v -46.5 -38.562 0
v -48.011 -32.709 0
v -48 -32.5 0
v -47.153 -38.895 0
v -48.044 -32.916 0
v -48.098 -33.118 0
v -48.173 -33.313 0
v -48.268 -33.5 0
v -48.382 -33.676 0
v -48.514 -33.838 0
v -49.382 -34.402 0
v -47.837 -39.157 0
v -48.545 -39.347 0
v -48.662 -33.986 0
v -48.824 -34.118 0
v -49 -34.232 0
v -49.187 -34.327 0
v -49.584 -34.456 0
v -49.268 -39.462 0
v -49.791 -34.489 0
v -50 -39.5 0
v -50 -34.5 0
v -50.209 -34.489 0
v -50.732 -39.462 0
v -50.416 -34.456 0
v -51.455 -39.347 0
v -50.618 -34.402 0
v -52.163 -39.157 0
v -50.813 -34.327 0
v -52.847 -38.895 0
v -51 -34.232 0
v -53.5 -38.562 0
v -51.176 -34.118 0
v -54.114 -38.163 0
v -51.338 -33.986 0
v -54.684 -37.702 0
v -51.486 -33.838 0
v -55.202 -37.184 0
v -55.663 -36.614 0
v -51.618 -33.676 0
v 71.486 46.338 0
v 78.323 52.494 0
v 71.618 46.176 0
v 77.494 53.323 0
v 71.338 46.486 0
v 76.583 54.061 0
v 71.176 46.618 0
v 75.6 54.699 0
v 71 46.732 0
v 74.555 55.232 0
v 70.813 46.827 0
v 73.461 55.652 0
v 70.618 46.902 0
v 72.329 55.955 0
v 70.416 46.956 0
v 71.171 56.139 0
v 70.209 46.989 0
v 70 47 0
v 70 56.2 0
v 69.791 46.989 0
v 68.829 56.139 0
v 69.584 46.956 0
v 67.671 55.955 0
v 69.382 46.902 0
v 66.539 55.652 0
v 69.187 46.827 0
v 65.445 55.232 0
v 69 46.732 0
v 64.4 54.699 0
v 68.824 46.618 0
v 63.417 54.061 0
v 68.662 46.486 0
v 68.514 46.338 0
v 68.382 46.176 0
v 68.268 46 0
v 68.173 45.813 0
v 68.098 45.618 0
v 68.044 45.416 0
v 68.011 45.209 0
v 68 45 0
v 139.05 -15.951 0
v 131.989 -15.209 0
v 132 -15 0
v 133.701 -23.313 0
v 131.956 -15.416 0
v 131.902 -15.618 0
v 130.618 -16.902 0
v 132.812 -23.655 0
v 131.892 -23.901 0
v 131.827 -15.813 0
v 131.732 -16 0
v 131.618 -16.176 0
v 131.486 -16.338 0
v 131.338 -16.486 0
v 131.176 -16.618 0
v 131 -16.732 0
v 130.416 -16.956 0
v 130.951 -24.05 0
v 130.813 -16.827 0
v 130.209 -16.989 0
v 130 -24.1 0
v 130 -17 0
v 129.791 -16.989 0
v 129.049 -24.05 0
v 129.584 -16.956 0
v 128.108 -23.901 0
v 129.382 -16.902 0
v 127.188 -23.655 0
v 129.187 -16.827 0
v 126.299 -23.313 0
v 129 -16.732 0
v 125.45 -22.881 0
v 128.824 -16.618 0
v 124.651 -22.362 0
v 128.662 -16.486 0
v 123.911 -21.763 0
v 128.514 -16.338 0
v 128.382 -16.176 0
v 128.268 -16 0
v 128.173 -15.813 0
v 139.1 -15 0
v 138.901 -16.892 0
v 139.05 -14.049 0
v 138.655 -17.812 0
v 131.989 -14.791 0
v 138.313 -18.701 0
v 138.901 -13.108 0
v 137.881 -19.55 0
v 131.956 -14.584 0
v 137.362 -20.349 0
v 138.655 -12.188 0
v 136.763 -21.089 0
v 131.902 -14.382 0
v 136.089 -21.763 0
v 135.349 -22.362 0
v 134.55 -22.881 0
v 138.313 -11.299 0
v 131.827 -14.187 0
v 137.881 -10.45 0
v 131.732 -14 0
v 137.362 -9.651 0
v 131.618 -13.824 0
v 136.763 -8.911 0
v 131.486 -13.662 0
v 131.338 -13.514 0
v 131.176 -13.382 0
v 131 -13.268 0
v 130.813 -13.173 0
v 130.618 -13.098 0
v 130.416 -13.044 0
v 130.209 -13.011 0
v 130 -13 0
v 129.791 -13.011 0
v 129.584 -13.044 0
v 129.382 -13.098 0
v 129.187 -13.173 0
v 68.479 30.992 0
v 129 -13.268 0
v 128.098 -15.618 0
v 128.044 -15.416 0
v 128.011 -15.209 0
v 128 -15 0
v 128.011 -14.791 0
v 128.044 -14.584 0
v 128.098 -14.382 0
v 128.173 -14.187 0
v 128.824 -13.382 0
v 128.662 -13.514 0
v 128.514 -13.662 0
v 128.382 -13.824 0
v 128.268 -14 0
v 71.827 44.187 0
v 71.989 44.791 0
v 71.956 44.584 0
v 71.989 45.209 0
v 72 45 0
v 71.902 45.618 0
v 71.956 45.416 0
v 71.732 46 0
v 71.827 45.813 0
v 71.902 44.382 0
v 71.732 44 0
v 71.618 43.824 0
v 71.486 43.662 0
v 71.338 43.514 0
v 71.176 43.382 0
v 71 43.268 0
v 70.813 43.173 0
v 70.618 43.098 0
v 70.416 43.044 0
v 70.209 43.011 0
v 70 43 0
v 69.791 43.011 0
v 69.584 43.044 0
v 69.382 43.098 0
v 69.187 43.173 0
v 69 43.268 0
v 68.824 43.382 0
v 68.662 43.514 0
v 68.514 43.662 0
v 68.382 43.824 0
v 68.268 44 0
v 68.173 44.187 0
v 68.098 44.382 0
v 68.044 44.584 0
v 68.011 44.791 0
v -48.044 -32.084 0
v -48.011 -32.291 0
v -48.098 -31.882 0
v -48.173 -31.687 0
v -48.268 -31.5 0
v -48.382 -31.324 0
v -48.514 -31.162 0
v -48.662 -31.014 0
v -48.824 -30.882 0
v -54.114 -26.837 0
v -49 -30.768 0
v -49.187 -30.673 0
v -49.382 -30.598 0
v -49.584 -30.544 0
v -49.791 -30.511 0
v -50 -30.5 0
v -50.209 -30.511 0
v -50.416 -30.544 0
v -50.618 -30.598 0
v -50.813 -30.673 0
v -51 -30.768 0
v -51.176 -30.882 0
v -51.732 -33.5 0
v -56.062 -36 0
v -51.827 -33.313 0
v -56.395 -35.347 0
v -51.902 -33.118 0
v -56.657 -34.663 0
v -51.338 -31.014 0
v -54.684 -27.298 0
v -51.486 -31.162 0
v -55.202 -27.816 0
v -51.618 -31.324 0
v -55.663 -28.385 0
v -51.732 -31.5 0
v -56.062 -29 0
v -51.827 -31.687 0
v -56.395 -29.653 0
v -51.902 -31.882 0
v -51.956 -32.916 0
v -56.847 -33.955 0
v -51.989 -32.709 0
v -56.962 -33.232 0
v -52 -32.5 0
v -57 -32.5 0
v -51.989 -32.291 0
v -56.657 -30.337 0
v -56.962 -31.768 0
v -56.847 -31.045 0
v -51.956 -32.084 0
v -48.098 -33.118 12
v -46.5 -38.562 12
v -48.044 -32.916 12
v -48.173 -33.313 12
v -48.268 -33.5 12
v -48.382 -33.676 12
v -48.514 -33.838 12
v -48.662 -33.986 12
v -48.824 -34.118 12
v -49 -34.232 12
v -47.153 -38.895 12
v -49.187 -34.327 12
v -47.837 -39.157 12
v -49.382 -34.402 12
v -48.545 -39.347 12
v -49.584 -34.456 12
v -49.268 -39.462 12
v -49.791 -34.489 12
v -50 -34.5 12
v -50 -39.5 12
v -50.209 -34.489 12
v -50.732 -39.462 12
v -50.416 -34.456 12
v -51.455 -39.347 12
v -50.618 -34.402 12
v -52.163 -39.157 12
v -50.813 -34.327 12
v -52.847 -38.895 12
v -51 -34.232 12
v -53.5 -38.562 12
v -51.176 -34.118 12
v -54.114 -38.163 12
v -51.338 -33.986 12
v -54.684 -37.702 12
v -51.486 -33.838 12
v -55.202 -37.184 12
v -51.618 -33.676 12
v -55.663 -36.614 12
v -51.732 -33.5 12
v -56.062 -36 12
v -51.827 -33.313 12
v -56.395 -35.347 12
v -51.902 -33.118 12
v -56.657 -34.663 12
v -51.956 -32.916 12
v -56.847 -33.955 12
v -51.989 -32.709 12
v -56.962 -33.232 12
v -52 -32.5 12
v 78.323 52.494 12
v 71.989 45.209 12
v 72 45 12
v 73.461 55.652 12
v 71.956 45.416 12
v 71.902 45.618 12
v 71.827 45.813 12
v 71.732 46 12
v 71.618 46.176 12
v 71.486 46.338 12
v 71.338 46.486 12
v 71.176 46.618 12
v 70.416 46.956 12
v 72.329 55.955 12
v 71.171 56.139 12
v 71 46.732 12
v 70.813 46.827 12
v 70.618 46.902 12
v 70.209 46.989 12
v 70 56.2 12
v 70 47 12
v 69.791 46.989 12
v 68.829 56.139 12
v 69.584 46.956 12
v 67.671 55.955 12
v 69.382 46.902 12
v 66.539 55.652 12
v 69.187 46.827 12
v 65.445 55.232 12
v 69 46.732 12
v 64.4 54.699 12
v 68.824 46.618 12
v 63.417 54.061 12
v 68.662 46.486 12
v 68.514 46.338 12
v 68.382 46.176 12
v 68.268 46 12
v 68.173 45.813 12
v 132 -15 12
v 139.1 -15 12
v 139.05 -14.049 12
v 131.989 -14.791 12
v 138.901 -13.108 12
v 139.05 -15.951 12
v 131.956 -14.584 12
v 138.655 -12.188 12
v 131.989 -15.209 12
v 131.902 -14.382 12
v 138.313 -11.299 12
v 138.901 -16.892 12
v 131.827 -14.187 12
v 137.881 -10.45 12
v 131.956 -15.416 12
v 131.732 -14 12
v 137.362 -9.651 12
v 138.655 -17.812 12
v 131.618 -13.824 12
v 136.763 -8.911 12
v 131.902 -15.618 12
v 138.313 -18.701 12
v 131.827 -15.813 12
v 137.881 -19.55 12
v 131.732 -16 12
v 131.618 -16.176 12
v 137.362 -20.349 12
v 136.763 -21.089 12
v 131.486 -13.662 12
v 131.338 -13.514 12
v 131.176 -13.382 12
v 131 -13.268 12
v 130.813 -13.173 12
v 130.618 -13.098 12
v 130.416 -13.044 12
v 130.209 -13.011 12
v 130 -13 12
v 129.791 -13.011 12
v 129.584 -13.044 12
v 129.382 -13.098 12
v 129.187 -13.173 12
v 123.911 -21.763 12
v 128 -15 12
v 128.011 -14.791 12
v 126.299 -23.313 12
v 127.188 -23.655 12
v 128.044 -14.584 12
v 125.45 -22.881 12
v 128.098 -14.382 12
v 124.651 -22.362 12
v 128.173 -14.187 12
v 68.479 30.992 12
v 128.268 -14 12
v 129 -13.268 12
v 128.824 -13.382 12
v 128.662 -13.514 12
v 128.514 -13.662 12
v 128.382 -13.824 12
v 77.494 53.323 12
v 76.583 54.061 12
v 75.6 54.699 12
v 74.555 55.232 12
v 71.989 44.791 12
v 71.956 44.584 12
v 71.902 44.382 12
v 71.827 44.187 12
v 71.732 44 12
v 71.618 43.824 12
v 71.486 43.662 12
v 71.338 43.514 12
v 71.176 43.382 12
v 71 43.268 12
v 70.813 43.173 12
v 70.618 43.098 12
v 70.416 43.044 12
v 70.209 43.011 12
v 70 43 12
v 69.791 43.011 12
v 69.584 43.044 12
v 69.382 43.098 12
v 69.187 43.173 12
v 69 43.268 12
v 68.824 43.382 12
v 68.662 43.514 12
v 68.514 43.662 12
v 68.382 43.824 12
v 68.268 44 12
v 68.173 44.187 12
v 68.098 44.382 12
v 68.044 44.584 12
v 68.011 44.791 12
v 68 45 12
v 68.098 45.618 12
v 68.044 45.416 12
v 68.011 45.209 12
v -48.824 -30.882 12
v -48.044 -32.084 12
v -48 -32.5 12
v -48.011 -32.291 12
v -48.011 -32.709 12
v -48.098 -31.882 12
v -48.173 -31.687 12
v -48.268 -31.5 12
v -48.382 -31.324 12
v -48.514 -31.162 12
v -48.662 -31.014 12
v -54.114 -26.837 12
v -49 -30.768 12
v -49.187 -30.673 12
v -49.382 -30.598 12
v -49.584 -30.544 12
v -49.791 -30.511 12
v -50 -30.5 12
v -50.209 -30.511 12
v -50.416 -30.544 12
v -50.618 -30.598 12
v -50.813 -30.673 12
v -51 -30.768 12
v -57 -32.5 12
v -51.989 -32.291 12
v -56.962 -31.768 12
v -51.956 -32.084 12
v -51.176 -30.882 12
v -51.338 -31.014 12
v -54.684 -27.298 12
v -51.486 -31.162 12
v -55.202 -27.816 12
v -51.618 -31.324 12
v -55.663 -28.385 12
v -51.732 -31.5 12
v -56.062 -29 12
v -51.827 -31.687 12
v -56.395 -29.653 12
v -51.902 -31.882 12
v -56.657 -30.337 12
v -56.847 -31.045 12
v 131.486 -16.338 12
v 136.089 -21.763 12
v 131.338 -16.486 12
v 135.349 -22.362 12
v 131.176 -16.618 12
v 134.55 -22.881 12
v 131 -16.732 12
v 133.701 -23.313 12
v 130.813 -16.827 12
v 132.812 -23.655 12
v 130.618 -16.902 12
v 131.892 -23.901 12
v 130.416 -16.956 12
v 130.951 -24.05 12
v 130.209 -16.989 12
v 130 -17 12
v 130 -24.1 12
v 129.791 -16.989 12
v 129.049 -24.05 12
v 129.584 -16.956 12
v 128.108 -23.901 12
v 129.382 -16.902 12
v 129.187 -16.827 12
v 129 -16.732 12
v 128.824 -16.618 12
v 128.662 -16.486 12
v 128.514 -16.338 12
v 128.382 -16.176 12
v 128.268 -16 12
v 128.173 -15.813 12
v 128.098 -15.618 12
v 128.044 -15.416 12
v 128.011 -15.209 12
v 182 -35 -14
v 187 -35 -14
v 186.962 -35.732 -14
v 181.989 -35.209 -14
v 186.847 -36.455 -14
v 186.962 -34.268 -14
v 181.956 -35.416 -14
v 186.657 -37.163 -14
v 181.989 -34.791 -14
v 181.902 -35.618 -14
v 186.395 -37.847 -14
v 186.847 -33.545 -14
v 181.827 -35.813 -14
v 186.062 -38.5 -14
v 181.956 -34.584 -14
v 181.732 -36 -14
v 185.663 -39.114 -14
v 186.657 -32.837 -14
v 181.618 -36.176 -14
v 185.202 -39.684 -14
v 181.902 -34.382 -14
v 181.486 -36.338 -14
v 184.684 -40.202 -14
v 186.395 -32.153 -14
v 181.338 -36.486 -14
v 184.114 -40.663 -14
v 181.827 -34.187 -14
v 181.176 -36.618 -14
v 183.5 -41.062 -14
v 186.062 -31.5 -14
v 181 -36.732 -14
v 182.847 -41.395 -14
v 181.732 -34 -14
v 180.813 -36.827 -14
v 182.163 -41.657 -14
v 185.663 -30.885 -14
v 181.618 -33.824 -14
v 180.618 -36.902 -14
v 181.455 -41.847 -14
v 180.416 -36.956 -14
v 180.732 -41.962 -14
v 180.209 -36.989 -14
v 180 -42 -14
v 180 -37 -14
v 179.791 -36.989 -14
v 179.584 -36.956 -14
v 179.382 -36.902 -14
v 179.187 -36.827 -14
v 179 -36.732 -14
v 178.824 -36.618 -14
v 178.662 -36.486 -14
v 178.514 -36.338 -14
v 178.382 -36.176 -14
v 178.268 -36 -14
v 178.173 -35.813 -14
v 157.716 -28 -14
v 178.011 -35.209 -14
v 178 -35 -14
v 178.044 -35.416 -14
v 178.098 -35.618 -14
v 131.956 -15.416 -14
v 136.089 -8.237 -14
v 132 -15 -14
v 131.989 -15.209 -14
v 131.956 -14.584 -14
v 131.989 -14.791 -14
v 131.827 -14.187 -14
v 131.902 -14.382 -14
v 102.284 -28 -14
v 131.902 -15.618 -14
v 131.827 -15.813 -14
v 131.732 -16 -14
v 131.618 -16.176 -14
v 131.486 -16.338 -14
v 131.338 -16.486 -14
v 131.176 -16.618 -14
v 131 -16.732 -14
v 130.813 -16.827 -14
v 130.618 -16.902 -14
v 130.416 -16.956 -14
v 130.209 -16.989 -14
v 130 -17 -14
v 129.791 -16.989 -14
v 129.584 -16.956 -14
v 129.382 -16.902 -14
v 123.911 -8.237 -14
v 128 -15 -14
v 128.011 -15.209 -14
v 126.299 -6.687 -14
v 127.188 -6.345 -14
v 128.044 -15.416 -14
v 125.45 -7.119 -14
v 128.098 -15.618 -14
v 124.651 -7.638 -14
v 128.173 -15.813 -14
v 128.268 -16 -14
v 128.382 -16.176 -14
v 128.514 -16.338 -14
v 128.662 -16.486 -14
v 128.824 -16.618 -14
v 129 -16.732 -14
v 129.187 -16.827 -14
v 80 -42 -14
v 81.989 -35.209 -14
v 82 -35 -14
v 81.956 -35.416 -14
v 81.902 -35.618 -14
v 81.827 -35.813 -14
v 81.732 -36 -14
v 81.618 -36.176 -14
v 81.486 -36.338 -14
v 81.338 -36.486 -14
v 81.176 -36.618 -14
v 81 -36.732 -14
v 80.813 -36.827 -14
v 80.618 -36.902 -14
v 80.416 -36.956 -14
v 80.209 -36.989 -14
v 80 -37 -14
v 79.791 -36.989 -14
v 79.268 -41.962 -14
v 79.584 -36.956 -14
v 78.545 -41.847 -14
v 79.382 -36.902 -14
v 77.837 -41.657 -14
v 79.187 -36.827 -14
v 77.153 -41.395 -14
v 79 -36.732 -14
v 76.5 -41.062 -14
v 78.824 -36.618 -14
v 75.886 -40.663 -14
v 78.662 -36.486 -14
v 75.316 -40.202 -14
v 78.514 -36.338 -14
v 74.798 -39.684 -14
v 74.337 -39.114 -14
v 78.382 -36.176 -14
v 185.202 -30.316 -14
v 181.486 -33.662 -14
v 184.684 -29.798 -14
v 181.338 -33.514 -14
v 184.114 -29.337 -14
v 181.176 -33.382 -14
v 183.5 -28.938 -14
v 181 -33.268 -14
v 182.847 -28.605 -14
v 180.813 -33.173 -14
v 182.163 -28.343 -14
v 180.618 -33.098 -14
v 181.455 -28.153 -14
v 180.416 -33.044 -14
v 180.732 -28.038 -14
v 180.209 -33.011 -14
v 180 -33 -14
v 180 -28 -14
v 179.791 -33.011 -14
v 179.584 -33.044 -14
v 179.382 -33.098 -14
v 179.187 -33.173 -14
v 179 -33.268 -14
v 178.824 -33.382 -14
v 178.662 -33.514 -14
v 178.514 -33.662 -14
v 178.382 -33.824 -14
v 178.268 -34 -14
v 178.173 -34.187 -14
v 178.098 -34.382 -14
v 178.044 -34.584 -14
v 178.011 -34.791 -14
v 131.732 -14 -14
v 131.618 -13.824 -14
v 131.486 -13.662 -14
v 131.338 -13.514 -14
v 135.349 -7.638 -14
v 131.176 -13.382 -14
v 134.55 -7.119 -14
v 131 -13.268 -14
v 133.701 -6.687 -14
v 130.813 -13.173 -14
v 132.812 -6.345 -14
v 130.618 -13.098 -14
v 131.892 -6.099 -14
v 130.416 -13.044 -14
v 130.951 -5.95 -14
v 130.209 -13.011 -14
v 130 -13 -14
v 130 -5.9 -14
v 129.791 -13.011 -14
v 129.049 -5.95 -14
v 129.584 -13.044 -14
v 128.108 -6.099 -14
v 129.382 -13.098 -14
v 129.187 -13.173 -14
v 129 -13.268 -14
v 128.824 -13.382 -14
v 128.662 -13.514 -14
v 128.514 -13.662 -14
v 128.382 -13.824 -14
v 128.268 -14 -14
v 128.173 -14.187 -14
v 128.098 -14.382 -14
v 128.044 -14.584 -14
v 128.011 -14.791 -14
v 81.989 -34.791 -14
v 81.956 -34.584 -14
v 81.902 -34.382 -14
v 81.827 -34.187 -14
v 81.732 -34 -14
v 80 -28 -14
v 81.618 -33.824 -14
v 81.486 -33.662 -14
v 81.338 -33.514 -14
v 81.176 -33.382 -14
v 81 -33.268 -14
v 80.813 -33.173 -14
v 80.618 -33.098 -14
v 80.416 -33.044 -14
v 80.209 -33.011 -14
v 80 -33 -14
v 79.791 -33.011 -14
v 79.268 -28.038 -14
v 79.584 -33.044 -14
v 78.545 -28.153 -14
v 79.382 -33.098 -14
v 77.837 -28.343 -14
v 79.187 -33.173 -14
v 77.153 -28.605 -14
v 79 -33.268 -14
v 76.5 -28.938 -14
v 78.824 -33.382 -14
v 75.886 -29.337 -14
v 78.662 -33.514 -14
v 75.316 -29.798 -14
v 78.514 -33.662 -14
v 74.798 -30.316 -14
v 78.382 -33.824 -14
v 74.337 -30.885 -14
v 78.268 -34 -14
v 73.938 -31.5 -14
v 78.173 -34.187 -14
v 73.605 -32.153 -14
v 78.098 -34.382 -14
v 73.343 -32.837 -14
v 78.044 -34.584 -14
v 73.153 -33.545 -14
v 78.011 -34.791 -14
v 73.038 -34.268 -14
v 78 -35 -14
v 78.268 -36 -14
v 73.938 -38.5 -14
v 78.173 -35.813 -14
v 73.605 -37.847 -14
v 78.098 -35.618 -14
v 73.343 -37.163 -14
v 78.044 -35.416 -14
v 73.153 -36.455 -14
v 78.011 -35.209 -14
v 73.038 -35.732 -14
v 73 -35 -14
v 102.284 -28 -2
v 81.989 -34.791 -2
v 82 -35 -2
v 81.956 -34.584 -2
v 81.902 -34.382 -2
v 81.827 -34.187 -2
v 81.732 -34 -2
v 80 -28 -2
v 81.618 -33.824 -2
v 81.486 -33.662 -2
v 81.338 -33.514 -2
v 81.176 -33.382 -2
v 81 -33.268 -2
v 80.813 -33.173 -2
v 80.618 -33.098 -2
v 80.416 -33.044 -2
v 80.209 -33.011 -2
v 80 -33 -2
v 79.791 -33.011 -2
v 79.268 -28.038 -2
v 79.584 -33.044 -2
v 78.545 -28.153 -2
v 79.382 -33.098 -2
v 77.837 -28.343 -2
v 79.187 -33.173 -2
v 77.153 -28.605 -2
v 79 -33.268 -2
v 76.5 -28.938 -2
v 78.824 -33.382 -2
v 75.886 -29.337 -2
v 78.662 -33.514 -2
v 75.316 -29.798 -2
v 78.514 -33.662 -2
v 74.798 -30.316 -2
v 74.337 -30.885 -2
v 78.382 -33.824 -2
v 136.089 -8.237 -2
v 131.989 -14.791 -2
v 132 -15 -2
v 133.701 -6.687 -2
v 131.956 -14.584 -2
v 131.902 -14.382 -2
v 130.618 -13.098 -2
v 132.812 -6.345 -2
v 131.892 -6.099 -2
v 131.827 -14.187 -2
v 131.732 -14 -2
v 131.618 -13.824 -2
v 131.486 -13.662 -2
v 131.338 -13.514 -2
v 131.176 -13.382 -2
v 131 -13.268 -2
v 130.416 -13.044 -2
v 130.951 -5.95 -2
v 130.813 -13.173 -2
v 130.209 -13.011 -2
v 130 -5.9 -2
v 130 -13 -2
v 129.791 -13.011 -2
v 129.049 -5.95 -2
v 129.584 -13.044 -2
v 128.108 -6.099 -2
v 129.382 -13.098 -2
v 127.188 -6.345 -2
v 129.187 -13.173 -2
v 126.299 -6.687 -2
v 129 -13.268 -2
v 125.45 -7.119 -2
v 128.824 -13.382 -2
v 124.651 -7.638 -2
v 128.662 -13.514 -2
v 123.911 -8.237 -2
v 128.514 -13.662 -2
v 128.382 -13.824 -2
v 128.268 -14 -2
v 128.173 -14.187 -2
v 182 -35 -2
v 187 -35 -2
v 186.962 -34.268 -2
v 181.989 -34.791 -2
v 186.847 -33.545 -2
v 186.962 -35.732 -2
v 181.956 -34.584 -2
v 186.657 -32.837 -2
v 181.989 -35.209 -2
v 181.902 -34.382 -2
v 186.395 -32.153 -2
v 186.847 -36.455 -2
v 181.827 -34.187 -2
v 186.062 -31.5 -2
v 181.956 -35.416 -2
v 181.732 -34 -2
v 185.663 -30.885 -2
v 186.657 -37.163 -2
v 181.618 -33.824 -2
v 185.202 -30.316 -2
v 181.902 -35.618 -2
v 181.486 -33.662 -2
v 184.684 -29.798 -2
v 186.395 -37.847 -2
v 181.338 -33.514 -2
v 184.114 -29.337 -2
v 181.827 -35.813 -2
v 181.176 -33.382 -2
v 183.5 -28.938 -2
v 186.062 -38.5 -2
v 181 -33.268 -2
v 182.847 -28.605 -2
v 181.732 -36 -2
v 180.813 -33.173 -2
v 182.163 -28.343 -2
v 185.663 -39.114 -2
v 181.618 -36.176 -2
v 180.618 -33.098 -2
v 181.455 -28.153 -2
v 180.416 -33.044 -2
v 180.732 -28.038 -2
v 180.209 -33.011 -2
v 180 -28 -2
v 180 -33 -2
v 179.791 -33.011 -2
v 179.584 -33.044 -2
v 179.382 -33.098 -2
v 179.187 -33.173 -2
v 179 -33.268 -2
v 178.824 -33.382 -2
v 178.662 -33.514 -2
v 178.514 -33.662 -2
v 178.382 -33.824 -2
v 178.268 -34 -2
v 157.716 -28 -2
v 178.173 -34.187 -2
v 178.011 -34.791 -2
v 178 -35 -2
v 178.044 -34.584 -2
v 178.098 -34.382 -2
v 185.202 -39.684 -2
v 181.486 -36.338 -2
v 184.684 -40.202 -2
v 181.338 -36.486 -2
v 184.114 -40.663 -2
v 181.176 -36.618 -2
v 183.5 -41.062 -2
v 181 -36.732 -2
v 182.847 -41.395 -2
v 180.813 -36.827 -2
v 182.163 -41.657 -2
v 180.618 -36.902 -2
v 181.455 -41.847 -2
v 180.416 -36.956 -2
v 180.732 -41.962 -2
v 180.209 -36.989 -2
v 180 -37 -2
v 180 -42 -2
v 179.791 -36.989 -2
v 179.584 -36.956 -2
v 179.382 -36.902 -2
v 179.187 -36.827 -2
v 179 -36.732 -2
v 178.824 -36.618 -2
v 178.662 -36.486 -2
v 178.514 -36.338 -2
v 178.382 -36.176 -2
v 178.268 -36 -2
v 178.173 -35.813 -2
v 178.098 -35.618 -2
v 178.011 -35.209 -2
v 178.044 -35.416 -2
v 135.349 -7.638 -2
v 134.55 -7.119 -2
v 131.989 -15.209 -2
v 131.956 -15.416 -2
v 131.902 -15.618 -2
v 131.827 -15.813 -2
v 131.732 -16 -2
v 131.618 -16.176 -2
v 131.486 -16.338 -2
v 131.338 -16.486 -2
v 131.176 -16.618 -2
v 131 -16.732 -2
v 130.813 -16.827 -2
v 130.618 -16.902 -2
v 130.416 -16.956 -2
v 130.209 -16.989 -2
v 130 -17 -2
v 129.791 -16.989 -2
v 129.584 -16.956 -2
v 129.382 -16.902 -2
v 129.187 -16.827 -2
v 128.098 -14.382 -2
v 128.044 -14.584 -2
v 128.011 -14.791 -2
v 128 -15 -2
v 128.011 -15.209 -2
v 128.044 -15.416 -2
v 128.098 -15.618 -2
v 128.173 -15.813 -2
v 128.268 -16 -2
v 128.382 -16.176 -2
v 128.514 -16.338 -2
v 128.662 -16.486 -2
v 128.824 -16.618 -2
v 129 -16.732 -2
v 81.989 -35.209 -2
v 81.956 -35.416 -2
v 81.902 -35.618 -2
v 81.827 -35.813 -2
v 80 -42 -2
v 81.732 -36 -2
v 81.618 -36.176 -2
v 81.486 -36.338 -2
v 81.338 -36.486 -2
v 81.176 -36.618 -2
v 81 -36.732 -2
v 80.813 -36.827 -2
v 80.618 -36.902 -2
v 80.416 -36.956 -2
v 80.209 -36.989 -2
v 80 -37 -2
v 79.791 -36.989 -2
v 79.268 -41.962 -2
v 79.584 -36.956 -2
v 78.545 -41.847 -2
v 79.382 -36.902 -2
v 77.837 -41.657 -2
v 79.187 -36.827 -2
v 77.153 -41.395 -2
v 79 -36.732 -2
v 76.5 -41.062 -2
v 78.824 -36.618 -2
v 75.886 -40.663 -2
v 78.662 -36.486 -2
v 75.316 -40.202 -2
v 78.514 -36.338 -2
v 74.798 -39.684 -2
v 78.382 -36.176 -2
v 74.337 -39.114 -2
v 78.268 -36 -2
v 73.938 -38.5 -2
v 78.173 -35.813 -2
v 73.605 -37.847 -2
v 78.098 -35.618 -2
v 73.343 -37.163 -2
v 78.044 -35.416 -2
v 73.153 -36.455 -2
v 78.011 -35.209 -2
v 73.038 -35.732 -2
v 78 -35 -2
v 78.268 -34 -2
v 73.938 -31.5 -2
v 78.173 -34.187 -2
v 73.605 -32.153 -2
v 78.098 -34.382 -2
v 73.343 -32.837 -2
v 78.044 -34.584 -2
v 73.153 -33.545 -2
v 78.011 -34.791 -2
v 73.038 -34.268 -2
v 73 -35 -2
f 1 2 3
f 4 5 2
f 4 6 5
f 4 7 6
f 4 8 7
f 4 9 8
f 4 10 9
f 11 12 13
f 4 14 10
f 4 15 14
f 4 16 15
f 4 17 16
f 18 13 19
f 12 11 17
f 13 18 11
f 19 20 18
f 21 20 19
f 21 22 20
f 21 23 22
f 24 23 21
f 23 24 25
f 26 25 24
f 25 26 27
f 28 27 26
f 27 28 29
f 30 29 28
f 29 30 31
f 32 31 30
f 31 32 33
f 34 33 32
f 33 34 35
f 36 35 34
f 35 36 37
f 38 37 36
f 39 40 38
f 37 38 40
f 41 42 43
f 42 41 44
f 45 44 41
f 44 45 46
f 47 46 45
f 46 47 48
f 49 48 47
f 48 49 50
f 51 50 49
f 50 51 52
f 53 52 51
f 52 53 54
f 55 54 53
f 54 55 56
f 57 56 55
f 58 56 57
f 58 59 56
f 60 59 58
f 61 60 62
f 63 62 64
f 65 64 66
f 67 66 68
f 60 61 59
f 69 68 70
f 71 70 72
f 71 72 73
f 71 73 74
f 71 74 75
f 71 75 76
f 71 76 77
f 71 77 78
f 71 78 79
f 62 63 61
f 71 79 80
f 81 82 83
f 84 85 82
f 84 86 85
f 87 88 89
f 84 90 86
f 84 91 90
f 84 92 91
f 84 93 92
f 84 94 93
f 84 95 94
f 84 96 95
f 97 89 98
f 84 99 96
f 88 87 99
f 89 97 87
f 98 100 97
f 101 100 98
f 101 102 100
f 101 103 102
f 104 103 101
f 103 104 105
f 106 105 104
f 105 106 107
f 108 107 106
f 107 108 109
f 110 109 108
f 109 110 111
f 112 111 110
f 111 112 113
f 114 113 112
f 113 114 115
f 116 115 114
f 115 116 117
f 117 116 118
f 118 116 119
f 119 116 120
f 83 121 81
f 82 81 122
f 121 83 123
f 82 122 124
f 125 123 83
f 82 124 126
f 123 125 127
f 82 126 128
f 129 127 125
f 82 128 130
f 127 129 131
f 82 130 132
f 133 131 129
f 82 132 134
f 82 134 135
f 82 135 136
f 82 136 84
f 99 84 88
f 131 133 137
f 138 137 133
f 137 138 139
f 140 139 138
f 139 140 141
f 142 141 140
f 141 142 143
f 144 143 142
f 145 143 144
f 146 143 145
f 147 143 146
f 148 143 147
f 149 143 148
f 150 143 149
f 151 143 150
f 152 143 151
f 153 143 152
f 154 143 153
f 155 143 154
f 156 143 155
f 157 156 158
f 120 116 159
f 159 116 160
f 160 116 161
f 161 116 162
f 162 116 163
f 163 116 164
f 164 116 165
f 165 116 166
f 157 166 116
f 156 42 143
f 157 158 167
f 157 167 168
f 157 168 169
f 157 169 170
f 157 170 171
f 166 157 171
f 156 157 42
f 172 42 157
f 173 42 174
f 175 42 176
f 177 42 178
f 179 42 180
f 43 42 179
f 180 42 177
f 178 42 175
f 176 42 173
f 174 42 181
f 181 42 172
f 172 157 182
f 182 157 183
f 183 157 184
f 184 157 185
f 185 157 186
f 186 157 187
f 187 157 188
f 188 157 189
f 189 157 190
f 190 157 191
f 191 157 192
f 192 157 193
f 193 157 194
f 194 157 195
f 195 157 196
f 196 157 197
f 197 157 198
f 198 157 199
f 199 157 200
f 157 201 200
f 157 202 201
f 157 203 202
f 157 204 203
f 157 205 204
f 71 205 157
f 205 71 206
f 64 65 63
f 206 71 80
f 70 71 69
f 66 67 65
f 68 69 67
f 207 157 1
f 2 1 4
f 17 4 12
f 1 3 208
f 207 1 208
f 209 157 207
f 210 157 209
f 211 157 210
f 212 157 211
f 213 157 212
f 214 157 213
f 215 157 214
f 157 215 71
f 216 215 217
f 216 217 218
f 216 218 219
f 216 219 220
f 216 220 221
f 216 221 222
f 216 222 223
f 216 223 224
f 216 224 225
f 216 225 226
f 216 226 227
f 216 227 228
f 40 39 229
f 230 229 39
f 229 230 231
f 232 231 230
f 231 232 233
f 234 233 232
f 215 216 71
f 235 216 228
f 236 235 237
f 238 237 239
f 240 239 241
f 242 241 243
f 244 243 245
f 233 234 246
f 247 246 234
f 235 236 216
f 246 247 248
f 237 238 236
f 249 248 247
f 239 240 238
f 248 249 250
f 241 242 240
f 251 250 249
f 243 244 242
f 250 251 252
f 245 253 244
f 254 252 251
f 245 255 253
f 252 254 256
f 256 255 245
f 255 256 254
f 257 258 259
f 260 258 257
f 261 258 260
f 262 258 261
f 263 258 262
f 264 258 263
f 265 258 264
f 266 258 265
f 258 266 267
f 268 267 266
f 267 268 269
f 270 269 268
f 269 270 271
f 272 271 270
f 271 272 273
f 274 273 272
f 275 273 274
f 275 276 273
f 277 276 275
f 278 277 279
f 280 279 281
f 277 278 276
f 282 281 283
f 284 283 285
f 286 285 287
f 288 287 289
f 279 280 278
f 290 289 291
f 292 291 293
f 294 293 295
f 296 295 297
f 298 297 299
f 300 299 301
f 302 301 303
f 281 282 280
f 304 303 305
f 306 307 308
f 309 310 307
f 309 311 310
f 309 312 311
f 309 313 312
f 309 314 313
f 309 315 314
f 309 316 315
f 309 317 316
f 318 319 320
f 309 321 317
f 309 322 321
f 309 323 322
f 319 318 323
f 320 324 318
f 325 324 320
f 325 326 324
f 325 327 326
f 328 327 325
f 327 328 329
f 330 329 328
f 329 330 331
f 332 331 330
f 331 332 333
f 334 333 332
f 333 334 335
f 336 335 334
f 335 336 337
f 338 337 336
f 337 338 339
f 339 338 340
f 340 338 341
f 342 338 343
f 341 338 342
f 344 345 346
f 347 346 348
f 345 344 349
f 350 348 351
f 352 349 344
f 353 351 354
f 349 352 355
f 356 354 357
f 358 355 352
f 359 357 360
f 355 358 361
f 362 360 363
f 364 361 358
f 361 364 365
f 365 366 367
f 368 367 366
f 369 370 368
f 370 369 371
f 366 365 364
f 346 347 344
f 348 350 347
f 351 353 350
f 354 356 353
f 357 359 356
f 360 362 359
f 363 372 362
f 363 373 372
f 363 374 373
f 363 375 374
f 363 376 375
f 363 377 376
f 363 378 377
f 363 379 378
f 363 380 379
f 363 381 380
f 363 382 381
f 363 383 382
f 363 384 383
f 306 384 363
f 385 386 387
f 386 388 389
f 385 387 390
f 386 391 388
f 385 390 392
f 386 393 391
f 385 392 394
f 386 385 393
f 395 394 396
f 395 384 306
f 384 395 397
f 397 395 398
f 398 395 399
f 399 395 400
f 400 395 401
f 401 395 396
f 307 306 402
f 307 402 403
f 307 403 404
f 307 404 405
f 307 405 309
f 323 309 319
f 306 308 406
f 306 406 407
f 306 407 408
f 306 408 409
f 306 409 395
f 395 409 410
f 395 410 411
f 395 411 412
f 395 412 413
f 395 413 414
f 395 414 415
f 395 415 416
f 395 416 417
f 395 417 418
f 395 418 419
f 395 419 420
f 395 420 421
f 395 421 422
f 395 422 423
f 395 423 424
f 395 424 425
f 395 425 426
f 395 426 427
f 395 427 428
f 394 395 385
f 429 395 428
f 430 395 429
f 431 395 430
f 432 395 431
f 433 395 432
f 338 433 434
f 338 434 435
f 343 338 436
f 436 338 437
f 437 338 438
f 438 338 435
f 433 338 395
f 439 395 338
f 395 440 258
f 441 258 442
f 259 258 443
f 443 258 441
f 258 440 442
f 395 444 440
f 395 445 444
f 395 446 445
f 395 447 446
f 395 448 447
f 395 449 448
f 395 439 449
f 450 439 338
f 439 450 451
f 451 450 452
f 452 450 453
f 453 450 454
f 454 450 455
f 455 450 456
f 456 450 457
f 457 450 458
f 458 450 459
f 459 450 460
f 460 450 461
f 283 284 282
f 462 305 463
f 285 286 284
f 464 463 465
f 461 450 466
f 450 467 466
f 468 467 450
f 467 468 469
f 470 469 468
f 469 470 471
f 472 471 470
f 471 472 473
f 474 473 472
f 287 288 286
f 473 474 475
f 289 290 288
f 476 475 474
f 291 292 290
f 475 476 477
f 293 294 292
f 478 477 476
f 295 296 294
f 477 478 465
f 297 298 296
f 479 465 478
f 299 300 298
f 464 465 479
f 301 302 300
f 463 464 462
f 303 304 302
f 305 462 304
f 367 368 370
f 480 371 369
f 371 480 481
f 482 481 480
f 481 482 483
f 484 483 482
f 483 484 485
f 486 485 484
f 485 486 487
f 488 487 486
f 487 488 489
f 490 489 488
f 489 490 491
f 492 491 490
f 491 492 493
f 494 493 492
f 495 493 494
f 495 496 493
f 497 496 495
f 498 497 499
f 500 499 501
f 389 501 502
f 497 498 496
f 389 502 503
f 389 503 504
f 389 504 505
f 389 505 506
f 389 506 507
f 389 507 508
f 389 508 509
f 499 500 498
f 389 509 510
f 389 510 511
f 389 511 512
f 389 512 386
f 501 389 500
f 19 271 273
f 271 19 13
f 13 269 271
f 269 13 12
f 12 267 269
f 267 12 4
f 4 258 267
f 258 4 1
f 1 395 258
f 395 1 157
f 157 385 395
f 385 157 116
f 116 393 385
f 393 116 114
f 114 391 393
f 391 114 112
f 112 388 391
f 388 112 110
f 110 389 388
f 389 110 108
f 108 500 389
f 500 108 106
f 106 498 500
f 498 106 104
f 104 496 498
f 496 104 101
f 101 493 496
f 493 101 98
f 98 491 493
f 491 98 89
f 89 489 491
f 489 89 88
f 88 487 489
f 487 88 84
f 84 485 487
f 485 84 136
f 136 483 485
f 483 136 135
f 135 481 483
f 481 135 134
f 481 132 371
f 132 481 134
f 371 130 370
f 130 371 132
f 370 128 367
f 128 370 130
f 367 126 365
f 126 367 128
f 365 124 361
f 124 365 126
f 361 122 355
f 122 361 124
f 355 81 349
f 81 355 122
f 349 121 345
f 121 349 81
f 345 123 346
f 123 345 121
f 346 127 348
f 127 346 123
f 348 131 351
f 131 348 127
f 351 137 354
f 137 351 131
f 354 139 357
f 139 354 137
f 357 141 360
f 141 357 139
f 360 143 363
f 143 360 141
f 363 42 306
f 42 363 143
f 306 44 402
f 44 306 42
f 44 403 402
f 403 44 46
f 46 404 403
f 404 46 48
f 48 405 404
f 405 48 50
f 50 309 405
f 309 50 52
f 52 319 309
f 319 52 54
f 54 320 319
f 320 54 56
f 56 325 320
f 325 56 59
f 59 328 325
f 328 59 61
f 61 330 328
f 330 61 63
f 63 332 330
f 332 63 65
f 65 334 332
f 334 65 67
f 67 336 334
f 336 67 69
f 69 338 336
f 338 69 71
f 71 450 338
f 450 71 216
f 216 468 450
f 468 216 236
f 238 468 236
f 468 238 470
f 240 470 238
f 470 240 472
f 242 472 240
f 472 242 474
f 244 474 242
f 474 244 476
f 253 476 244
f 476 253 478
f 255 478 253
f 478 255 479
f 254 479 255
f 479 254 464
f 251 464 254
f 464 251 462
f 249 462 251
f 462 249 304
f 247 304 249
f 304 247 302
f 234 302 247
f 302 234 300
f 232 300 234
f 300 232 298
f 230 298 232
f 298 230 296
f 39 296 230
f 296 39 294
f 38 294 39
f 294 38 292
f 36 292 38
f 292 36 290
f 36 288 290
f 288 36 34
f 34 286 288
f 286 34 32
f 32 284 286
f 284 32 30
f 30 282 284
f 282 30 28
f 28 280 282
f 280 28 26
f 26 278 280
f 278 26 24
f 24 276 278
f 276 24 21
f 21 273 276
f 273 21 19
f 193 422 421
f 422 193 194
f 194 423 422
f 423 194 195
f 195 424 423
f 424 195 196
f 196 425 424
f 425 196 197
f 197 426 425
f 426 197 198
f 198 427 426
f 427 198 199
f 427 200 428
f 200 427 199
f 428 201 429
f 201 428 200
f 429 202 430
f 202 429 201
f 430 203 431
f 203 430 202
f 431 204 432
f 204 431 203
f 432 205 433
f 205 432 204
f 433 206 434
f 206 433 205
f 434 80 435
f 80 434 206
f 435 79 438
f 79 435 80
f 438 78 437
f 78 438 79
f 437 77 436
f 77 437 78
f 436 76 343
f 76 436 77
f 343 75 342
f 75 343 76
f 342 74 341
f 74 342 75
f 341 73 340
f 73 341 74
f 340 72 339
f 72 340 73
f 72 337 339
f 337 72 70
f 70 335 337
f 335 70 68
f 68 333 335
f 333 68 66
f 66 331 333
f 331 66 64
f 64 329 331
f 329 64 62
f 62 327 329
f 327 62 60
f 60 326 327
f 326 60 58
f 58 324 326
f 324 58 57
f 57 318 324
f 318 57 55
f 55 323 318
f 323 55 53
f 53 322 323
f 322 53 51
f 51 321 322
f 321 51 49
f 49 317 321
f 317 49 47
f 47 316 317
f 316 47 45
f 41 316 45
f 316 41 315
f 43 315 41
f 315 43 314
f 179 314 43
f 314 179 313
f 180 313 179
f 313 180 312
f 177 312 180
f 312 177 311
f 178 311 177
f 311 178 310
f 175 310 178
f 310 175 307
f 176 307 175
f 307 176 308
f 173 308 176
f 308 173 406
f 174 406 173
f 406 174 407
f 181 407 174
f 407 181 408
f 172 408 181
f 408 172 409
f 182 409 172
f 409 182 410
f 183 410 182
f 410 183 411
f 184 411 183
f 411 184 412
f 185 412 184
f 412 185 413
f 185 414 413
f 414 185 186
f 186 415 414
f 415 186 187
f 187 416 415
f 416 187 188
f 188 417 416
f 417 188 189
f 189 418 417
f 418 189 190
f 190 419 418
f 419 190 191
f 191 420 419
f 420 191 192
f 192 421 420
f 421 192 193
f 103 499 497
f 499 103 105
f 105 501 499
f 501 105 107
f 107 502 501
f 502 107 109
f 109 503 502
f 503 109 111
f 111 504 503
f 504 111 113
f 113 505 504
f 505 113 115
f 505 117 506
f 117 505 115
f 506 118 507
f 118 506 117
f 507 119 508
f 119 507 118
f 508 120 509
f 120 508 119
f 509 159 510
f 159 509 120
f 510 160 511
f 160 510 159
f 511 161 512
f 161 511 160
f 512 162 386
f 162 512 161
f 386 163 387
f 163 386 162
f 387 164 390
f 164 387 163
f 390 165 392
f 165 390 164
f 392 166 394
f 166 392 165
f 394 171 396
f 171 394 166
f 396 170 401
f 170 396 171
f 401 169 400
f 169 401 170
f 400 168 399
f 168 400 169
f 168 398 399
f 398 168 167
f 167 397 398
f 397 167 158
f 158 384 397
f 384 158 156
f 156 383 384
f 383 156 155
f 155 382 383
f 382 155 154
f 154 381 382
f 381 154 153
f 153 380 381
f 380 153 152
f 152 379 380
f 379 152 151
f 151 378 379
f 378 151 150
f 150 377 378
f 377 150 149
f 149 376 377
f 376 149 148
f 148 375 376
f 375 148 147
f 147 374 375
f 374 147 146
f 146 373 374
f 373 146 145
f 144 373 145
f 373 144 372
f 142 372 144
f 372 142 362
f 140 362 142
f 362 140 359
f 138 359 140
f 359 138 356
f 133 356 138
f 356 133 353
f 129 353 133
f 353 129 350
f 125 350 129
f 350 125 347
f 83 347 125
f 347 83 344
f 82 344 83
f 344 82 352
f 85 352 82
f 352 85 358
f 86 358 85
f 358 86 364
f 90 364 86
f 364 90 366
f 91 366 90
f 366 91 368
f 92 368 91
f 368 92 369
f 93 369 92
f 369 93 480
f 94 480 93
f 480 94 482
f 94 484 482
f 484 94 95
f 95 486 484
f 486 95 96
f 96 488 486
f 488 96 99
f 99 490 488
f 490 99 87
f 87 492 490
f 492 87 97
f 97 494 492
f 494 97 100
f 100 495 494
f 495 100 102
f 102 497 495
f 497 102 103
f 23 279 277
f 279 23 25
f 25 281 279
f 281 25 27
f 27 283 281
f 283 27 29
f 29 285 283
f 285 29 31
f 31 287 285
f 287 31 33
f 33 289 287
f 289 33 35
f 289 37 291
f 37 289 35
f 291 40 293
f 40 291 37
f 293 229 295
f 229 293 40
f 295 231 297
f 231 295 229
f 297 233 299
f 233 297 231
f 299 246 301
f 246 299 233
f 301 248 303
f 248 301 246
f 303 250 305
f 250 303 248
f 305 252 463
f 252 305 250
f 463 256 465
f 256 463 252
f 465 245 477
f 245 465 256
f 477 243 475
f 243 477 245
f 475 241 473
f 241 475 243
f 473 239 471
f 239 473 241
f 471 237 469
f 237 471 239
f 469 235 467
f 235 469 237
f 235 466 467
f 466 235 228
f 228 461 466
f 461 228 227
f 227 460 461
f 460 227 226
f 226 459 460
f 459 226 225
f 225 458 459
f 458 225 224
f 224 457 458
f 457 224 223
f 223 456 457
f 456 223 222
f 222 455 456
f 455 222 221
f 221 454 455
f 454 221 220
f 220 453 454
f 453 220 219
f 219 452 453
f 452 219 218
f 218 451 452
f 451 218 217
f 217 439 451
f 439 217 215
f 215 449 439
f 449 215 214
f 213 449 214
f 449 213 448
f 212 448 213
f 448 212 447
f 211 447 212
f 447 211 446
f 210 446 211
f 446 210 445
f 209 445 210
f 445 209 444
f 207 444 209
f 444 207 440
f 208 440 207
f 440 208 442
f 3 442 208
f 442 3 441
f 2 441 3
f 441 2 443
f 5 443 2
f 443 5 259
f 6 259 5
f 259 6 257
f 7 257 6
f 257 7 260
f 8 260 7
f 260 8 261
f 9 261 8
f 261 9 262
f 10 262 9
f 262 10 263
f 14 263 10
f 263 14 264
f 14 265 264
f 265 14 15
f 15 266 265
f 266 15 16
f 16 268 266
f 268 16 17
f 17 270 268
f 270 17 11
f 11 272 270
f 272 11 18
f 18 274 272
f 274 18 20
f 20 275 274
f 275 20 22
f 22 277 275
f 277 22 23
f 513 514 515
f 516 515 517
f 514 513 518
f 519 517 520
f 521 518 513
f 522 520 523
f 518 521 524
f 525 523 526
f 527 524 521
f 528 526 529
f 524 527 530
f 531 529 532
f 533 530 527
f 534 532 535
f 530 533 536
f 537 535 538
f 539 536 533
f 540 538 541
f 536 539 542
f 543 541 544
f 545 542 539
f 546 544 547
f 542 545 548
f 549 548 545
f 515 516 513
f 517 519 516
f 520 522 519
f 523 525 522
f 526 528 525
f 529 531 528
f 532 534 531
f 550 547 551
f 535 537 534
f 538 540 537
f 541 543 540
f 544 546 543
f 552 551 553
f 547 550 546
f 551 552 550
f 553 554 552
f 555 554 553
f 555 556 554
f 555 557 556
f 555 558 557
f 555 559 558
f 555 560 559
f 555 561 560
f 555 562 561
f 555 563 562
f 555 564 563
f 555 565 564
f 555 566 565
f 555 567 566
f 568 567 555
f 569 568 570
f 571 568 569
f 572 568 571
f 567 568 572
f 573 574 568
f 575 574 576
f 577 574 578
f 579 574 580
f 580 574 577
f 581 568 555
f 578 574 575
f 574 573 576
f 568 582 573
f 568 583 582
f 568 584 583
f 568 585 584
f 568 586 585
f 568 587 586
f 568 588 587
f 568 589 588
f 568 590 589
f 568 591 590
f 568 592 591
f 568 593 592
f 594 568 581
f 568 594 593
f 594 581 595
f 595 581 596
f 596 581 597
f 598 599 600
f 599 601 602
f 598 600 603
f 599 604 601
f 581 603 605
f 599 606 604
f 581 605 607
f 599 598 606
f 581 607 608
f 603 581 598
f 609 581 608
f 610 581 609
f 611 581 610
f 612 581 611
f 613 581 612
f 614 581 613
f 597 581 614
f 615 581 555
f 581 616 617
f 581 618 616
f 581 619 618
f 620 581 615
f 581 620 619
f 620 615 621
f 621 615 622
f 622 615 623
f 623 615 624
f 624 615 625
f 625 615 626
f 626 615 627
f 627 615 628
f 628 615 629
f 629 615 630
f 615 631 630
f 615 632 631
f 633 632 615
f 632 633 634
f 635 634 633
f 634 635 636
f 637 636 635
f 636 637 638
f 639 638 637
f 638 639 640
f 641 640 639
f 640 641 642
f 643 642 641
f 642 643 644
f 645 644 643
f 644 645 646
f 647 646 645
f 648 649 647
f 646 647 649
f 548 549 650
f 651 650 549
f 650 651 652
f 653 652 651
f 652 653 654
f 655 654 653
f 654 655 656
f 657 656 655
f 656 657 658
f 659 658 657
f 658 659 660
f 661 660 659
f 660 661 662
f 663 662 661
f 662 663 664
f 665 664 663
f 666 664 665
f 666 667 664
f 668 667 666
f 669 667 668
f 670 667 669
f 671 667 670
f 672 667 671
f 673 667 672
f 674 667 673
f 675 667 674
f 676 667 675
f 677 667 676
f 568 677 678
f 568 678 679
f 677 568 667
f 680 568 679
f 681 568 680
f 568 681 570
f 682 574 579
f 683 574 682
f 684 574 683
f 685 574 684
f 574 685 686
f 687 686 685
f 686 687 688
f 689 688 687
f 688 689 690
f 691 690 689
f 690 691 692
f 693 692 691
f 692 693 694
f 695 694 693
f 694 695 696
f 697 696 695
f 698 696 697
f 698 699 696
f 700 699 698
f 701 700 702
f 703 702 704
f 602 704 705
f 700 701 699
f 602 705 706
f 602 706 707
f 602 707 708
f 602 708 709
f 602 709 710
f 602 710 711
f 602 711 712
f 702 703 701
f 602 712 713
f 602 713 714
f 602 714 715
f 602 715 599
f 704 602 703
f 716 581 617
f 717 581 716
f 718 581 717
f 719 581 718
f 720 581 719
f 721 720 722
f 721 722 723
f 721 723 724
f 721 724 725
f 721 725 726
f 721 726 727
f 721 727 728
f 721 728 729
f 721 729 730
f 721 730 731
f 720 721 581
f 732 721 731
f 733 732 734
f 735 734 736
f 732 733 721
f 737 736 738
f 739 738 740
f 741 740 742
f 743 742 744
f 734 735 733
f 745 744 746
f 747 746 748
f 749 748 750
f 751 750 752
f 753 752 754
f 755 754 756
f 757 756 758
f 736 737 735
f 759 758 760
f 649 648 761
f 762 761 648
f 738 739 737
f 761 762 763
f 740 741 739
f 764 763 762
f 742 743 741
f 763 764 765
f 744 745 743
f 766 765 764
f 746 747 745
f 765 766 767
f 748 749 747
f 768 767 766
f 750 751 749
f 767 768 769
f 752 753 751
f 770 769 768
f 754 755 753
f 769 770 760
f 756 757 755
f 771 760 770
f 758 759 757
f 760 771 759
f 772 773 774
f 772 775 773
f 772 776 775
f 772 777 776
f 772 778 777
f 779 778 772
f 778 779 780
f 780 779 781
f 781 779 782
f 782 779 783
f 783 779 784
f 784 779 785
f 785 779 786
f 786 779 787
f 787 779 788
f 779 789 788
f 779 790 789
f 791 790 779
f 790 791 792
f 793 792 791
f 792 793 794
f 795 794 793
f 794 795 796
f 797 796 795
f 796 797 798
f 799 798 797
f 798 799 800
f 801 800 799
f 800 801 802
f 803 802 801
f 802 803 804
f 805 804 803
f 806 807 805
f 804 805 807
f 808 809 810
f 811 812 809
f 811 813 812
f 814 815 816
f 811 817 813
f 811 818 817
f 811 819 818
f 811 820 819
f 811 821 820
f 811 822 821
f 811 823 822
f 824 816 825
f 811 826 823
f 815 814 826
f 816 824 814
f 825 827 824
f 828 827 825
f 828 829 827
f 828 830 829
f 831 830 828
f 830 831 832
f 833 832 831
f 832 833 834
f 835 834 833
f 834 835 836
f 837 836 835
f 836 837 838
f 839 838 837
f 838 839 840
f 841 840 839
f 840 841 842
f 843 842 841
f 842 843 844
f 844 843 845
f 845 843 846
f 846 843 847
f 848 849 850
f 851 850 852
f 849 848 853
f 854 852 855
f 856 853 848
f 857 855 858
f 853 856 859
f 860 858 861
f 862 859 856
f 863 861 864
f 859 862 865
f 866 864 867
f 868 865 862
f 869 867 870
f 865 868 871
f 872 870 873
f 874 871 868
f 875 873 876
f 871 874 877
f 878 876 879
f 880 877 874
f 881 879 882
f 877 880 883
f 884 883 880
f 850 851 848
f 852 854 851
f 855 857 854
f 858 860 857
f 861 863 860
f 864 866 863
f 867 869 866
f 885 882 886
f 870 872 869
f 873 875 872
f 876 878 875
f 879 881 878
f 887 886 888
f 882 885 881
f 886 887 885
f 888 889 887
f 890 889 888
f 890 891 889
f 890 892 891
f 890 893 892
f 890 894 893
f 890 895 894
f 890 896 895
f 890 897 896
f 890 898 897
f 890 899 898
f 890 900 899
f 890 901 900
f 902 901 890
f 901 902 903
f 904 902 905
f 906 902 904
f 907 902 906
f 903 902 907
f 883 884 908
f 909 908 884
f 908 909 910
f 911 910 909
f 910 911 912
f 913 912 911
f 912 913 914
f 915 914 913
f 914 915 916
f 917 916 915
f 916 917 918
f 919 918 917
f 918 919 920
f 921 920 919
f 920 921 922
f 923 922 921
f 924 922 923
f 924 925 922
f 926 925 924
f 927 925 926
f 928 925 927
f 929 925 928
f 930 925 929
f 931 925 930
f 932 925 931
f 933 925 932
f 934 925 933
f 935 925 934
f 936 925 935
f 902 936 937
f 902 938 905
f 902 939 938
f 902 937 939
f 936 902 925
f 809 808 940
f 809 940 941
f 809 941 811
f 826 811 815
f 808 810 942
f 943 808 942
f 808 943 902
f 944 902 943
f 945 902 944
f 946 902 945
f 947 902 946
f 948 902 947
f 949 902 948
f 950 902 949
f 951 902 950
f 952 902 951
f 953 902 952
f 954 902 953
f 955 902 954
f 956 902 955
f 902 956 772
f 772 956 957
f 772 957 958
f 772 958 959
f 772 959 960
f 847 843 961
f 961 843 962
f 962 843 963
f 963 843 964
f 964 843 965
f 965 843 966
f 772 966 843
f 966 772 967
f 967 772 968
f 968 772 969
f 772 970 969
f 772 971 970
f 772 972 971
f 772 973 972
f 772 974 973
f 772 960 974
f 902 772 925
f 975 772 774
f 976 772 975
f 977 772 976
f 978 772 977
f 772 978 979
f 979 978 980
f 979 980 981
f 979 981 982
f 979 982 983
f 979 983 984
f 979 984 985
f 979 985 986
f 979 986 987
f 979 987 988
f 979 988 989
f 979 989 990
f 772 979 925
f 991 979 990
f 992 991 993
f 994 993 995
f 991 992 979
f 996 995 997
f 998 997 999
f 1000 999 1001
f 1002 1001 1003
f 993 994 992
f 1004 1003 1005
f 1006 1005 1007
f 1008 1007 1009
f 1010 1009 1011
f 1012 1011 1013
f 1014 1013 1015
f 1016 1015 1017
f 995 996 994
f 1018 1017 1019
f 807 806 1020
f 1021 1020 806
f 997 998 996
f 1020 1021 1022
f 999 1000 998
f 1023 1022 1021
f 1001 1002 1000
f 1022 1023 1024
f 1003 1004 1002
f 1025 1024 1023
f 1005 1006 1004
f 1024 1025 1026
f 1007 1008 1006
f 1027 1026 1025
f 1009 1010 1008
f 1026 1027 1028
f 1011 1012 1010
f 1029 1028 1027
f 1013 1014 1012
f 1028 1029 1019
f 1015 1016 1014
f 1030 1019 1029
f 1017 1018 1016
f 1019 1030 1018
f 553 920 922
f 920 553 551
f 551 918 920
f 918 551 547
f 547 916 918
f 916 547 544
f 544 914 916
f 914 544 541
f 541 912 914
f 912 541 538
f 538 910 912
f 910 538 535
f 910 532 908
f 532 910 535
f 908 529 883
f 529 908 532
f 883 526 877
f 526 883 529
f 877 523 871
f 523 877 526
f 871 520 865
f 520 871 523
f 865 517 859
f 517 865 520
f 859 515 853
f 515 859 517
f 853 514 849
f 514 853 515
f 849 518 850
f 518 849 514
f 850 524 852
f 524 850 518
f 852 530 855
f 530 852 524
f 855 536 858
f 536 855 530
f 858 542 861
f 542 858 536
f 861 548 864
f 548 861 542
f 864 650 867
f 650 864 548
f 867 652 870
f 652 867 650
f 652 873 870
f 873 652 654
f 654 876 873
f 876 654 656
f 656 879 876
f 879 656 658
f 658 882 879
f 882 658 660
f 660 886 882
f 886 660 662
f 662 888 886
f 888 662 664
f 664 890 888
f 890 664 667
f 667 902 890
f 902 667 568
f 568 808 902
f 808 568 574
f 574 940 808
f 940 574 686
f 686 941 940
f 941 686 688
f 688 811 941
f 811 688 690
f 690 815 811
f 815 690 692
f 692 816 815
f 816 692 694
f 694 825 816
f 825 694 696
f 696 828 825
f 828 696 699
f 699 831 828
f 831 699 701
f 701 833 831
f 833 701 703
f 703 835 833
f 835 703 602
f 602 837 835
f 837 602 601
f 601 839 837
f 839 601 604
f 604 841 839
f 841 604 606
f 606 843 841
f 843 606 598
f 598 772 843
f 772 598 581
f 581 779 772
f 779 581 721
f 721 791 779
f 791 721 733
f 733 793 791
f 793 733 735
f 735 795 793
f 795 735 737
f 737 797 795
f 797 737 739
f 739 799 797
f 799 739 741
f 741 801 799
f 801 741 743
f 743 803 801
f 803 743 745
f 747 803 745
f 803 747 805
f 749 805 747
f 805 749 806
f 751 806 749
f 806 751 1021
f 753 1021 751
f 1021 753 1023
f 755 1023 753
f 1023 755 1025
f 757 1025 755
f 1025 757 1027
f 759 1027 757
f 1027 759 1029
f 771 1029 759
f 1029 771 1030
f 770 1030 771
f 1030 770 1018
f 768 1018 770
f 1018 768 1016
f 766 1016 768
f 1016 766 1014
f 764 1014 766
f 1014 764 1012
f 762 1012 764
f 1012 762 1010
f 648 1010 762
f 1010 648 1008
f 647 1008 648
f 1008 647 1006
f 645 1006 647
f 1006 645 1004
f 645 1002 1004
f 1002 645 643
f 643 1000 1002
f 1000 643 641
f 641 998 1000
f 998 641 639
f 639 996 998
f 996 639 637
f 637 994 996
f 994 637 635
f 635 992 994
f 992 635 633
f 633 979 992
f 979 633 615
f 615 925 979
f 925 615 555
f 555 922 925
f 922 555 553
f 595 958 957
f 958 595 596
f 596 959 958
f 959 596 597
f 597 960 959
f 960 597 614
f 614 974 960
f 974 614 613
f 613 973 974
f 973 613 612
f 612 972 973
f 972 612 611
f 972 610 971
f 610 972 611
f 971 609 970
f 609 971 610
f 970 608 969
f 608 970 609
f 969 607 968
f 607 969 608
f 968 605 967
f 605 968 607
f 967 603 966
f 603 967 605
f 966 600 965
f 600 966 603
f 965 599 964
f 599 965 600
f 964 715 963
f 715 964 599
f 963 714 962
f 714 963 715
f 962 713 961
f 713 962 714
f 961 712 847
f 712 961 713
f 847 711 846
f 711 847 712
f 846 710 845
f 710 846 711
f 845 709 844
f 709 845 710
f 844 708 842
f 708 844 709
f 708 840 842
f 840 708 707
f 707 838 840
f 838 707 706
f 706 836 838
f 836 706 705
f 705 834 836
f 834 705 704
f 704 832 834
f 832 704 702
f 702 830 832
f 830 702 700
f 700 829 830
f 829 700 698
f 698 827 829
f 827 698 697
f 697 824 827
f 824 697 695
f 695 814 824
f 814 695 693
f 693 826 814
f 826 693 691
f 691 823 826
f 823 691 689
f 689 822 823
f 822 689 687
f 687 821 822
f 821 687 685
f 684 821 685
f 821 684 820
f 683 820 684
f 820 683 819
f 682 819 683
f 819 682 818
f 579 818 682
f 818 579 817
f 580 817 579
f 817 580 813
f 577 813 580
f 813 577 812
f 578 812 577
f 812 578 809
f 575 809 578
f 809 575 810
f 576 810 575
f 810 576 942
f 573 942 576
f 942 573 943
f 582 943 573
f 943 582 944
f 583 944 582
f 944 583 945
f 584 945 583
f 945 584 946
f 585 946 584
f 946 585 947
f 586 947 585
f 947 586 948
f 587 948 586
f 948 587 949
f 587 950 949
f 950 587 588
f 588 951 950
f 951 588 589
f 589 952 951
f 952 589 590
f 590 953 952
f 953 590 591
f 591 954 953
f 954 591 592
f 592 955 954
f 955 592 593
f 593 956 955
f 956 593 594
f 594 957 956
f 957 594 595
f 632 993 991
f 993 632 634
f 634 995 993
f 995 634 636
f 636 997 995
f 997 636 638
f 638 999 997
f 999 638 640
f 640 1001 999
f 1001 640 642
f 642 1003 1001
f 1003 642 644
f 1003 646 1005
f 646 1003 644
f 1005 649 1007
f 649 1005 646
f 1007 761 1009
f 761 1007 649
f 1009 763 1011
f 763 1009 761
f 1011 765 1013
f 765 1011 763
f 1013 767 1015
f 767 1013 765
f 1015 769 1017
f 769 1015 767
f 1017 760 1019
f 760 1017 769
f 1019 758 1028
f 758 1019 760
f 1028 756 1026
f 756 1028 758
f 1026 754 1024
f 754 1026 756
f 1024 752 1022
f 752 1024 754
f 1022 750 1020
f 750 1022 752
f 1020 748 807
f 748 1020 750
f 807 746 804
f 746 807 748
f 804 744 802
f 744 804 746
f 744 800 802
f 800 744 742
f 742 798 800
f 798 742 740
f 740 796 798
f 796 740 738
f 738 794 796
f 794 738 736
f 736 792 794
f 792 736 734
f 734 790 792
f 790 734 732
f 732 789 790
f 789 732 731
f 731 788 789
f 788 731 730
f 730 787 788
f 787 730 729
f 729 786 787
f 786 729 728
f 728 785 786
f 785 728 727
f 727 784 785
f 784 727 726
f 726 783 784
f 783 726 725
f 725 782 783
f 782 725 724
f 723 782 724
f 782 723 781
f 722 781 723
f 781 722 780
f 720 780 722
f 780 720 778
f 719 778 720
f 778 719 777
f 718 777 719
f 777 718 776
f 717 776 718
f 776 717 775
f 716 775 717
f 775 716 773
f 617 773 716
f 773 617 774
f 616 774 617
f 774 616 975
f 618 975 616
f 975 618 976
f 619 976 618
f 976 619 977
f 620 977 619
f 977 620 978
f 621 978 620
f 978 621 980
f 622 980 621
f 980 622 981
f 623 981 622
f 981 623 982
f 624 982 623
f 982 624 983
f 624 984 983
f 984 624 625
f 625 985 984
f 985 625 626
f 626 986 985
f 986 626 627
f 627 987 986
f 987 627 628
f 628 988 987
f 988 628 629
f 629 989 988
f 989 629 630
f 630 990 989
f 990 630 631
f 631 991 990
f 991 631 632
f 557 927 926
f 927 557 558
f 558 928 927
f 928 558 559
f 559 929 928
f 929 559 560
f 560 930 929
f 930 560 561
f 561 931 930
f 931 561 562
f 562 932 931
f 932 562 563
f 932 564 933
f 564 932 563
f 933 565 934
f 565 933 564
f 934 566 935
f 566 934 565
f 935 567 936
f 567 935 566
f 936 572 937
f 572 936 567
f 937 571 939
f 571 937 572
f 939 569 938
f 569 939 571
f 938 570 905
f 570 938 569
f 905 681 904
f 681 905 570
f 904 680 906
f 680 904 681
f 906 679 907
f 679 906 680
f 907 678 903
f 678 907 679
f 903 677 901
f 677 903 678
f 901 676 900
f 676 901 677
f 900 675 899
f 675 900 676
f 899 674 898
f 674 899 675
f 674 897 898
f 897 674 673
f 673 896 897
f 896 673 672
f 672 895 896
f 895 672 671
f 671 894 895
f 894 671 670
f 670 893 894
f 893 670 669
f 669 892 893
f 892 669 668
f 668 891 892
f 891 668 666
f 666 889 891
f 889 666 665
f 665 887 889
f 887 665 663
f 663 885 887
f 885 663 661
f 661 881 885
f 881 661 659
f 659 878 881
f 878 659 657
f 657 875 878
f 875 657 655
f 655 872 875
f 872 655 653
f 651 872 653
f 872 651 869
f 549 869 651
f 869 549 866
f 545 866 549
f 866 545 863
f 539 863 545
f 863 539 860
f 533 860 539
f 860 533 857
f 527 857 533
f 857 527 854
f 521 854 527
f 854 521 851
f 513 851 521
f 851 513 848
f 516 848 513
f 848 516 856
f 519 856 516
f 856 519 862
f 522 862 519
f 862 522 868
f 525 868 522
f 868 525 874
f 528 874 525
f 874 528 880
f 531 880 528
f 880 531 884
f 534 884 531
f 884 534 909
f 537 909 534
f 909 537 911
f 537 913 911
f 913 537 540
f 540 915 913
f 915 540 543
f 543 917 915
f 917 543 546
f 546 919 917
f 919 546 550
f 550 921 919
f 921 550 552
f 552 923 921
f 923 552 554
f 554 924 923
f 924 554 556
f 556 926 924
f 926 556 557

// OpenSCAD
// =================================================================
// 直径5cmホイール対応 ロッカーボギー機構 パラメトリック設計
// =================================================================

/* [表示・出力コントロール] */
// 出力したいパーツを選択してください
part = "all"; // [all: 全て配置（確認用）, rocker: ロッカーアームのみ, bogie: ボギーアームのみ]

/* [共通パラメータ] */
$fn = 60;          // 円の分割数（精度）
link_h = 12;        // アームの厚み (mm)
pin_d = 4;         // シャフト・ネジ用の穴の直径 (mm) 
joint_d = 14;      // ジョイント結合部の外径 (mm) -

/* [既存ホイール基準パラメータ (変更不可)] */
wheel_d = 50;      // ホイールの直径 = 50mm (5cm)
wheel_r = wheel_d / 2; // ホイールの半径 = 25mm
wheel_w = 20;      // ホイールの想定幅 (mm)

/* [アーム寸法設計 (直径50mmホイールの干渉回避用)] */
// ボギーアームの軸間距離（ミドル〜リアホイール間）
bogie_length = 100; 

// ロッカーアームのフロント軸から、ボギーピボット（結合点）までの水平距離
rocker_total_x = 130; 


// --- パーツの配置・プレビュー処理 ---
if (part == "all") {
    // 1. ロッカーアーム
    color("LightCoral") rocker_arm();
    
    // 2. ボギーアーム（ロッカーアームのボギーピボット位置へ移動して配置）
    translate([rocker_total_x, -15, -link_h - 2]) 
        color("LightSteelBlue") bogie_arm();
    
    // 3. 既存ホイールのダミー表示（位置関係確認用：半透明）
    % group() {
        // フロントホイール
        translate([0, 10, 0]) rotate([90, 0, 0]) dummy_wheel();
        // ミドルホイール（ボギーアームの前方軸）
        translate([rocker_total_x - (bogie_length/2), -10, -link_h - 2]) rotate([90, 0, 0]) dummy_wheel();
        // リアホイール（ボギーアームの後方軸）
        translate([rocker_total_x + (bogie_length/2), -10, -link_h - 2]) rotate([90, 0, 0]) dummy_wheel();
    }
}

if (part == "rocker") {
    rocker_arm();
}

if (part == "bogie") {
    bogie_arm();
}


// ==========================================
// コンポーネント 1: ロッカーアーム (Rocker Arm)
// ==========================================
module rocker_arm() {
    // 各ピボットの座標定義
    p_front = [-50, -32.5];                     // フロントホイール軸
    p_body  = [70, 45];                   // 車体差動ギア接続ピボット
    p_bogie = [rocker_total_x, -15];      // ボギーアーム接続ピボット

    linear_extrude(height = link_h) {
        difference() {
            union() {
                // フロント軸から車体ピボットへのリンク
                hull() {
                    translate(p_front) circle(d = joint_d);
                    translate(p_body)  circle(d = joint_d * 1.6); // 負荷がかかる中心は太く
                }
                // 車体ピボットからボギーピボットへのリンク
                hull() {
                    translate(p_body)  circle(d = joint_d * 1.6);
                    translate(p_bogie) circle(d = joint_d * 1.3);
                }
            }
            // 1. フロントホイール取付穴
            translate(p_front) circle(d = pin_d); 
            
            // 2. 車体（ディファレンシャル機構）接続穴
            translate(p_body) circle(d = pin_d); 
            
            // 3. ボギーアーム接続穴
            translate(p_bogie) circle(d = pin_d); 
        }
    }
}

// ==========================================
// コンポーネント 2: ボギーアーム (Bogie Arm)
// ==========================================
module bogie_arm() {
    // ロッカーとの接続ピボットを原点(0,0)とする
    p_pivot = [0, 0];
    p_middle = [-(bogie_length / 2), -20]; // 前方（ミドルホイール）軸
    p_rear   = [(bogie_length / 2), -20];  // 後方（リアホイール）軸

    linear_extrude(height = link_h) {
        difference() {
            union() {
                // ミドルからリアまでの下部メインフレーム
                hull() {
                    translate(p_middle) circle(d = joint_d);
                    translate(p_rear)   circle(d = joint_d);
                }
                // 下部フレームから上部のロッカー接続ピボットへの立ち上がり
                hull() {
                    translate(p_pivot) circle(d = joint_d * 1.3);
                    translate([-(bogie_length / 4), -20]) circle(d = joint_d);
                    translate([(bogie_length / 4), -20]) circle(d = joint_d);
                }
            }
            // 1. ロッカーアームとの接続穴
            translate(p_pivot) circle(d = pin_d); 
            
            // 2. ミドルホイール取付穴
            translate(p_middle) circle(d = pin_d); 
            
            // 3. リアホイール取付穴
            translate(p_rear) circle(d = pin_d); 
        }
    }
}

// ==========================================
// 参考用: 既存ホイールのダミー (Dummy Wheel)
// ==========================================
// ※3Dプリントはしません（位置確認のプレビュー専用）
module dummy_wheel() {
    difference() {
        cylinder(r = wheel_r, h = wheel_w, center = true);
        cylinder(d = pin_d, h = wheel_w + 2, center = true);
    }
}
